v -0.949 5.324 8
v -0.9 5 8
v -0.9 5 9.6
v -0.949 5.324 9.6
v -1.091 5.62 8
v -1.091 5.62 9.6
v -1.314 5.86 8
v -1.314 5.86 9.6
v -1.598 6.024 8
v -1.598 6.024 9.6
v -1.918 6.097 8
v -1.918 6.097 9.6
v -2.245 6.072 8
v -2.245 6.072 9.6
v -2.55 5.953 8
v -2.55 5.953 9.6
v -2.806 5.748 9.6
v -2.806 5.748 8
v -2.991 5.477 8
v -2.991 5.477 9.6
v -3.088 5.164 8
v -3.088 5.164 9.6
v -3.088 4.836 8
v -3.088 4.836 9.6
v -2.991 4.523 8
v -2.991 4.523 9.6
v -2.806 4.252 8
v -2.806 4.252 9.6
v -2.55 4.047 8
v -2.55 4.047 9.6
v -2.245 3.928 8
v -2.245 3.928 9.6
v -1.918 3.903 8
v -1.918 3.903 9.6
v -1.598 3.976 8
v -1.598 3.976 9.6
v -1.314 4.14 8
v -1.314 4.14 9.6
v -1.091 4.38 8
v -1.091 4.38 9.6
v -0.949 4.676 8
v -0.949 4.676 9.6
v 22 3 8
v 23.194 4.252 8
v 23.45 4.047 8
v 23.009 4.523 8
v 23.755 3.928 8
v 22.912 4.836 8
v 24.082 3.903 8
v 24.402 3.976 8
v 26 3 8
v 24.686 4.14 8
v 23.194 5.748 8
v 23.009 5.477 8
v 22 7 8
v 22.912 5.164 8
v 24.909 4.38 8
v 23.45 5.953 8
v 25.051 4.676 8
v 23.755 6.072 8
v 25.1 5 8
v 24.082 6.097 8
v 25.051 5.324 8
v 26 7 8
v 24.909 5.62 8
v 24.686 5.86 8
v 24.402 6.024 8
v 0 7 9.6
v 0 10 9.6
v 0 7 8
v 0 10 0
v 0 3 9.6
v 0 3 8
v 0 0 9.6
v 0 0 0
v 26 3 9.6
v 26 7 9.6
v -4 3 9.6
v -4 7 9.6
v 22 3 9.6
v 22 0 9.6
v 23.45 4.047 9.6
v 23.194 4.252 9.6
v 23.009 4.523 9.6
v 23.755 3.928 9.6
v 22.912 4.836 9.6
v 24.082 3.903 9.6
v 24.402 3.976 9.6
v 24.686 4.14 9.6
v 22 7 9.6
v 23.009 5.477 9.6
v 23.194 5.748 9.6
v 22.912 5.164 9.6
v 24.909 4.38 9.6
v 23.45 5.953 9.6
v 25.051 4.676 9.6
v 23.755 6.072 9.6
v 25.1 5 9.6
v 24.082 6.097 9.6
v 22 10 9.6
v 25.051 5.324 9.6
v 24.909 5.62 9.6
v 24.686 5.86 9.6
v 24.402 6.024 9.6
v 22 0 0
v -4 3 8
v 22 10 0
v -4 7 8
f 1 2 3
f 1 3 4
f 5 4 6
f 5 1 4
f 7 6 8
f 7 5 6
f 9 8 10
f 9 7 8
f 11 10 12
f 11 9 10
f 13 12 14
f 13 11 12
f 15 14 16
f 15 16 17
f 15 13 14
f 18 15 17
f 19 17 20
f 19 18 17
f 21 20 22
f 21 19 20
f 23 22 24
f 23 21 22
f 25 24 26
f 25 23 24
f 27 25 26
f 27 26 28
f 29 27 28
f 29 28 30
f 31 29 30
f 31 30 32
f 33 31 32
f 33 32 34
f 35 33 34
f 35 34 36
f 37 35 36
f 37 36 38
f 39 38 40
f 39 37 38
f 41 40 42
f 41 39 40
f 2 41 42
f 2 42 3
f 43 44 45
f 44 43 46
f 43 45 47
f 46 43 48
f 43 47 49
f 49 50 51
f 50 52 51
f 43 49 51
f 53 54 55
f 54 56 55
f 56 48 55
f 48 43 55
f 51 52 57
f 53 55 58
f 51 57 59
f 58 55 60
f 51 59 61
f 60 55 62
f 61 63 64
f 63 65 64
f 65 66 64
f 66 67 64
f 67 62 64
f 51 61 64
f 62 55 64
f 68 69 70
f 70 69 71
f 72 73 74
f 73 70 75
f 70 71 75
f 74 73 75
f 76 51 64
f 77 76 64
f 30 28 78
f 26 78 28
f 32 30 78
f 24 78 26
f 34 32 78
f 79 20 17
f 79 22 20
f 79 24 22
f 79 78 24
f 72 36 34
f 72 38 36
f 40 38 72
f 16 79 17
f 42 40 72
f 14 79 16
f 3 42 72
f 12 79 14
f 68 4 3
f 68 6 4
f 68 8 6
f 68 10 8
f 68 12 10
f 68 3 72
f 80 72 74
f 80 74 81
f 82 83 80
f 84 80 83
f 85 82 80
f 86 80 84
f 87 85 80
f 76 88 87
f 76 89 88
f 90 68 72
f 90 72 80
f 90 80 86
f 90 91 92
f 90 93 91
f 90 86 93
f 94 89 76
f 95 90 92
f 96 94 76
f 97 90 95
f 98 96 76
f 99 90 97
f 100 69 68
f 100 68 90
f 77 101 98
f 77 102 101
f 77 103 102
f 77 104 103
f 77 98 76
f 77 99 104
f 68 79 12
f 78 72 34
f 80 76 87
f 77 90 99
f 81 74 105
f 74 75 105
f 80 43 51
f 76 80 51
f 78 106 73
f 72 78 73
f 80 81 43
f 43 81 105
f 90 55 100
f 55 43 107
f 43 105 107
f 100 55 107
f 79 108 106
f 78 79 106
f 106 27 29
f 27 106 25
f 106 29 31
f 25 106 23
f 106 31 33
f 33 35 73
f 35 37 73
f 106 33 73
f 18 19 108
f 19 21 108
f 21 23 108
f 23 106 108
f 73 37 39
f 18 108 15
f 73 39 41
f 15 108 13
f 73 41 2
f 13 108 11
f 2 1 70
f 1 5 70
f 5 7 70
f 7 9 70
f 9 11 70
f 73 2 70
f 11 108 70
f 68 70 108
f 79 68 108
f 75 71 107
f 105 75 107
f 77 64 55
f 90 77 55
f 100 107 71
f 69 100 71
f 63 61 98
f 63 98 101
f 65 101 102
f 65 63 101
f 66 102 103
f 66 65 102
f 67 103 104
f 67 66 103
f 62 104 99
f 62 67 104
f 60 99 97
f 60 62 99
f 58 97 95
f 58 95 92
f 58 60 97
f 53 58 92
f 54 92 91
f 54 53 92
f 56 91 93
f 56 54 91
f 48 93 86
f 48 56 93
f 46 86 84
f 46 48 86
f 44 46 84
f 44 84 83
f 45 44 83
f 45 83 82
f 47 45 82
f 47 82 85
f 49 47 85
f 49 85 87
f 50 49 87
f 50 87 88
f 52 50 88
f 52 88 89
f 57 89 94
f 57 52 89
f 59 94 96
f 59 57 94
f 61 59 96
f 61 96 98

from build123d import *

# Parameters (mm, degrees)
SKETCH_1_W      = 22
SKETCH_1_H      = 10
EXTRUDE_1_DEPTH = 8
SKETCH_2_R      = 1.1
EXTRUDE_2_DEPTH = 1.6


with BuildPart() as part:
    # 草图1 → 凸台-拉伸1 (new body)
    with BuildSketch(Plane.XY):
        with Locations((11, 5)):
            Rectangle(SKETCH_1_W, SKETCH_1_H)
    extrude(amount=EXTRUDE_1_DEPTH)

    # 草图2 → 凸台-拉伸2 (add)
    with BuildSketch(Plane.XY.offset(8)):
        Polygon((0, 7), (-4, 7), (-4, 3), (0, 3), (0, 0), (22, 0), (22, 3), (26, 3), (26, 7), (22, 7), (22, 10), (0, 10), align=None)
        with Locations((-2, 5)):
            Circle(SKETCH_2_R, mode=Mode.SUBTRACT)
        with Locations((24, 5)):
            Circle(SKETCH_2_R, mode=Mode.SUBTRACT)
    extrude(amount=EXTRUDE_2_DEPTH)


solid = part.part
